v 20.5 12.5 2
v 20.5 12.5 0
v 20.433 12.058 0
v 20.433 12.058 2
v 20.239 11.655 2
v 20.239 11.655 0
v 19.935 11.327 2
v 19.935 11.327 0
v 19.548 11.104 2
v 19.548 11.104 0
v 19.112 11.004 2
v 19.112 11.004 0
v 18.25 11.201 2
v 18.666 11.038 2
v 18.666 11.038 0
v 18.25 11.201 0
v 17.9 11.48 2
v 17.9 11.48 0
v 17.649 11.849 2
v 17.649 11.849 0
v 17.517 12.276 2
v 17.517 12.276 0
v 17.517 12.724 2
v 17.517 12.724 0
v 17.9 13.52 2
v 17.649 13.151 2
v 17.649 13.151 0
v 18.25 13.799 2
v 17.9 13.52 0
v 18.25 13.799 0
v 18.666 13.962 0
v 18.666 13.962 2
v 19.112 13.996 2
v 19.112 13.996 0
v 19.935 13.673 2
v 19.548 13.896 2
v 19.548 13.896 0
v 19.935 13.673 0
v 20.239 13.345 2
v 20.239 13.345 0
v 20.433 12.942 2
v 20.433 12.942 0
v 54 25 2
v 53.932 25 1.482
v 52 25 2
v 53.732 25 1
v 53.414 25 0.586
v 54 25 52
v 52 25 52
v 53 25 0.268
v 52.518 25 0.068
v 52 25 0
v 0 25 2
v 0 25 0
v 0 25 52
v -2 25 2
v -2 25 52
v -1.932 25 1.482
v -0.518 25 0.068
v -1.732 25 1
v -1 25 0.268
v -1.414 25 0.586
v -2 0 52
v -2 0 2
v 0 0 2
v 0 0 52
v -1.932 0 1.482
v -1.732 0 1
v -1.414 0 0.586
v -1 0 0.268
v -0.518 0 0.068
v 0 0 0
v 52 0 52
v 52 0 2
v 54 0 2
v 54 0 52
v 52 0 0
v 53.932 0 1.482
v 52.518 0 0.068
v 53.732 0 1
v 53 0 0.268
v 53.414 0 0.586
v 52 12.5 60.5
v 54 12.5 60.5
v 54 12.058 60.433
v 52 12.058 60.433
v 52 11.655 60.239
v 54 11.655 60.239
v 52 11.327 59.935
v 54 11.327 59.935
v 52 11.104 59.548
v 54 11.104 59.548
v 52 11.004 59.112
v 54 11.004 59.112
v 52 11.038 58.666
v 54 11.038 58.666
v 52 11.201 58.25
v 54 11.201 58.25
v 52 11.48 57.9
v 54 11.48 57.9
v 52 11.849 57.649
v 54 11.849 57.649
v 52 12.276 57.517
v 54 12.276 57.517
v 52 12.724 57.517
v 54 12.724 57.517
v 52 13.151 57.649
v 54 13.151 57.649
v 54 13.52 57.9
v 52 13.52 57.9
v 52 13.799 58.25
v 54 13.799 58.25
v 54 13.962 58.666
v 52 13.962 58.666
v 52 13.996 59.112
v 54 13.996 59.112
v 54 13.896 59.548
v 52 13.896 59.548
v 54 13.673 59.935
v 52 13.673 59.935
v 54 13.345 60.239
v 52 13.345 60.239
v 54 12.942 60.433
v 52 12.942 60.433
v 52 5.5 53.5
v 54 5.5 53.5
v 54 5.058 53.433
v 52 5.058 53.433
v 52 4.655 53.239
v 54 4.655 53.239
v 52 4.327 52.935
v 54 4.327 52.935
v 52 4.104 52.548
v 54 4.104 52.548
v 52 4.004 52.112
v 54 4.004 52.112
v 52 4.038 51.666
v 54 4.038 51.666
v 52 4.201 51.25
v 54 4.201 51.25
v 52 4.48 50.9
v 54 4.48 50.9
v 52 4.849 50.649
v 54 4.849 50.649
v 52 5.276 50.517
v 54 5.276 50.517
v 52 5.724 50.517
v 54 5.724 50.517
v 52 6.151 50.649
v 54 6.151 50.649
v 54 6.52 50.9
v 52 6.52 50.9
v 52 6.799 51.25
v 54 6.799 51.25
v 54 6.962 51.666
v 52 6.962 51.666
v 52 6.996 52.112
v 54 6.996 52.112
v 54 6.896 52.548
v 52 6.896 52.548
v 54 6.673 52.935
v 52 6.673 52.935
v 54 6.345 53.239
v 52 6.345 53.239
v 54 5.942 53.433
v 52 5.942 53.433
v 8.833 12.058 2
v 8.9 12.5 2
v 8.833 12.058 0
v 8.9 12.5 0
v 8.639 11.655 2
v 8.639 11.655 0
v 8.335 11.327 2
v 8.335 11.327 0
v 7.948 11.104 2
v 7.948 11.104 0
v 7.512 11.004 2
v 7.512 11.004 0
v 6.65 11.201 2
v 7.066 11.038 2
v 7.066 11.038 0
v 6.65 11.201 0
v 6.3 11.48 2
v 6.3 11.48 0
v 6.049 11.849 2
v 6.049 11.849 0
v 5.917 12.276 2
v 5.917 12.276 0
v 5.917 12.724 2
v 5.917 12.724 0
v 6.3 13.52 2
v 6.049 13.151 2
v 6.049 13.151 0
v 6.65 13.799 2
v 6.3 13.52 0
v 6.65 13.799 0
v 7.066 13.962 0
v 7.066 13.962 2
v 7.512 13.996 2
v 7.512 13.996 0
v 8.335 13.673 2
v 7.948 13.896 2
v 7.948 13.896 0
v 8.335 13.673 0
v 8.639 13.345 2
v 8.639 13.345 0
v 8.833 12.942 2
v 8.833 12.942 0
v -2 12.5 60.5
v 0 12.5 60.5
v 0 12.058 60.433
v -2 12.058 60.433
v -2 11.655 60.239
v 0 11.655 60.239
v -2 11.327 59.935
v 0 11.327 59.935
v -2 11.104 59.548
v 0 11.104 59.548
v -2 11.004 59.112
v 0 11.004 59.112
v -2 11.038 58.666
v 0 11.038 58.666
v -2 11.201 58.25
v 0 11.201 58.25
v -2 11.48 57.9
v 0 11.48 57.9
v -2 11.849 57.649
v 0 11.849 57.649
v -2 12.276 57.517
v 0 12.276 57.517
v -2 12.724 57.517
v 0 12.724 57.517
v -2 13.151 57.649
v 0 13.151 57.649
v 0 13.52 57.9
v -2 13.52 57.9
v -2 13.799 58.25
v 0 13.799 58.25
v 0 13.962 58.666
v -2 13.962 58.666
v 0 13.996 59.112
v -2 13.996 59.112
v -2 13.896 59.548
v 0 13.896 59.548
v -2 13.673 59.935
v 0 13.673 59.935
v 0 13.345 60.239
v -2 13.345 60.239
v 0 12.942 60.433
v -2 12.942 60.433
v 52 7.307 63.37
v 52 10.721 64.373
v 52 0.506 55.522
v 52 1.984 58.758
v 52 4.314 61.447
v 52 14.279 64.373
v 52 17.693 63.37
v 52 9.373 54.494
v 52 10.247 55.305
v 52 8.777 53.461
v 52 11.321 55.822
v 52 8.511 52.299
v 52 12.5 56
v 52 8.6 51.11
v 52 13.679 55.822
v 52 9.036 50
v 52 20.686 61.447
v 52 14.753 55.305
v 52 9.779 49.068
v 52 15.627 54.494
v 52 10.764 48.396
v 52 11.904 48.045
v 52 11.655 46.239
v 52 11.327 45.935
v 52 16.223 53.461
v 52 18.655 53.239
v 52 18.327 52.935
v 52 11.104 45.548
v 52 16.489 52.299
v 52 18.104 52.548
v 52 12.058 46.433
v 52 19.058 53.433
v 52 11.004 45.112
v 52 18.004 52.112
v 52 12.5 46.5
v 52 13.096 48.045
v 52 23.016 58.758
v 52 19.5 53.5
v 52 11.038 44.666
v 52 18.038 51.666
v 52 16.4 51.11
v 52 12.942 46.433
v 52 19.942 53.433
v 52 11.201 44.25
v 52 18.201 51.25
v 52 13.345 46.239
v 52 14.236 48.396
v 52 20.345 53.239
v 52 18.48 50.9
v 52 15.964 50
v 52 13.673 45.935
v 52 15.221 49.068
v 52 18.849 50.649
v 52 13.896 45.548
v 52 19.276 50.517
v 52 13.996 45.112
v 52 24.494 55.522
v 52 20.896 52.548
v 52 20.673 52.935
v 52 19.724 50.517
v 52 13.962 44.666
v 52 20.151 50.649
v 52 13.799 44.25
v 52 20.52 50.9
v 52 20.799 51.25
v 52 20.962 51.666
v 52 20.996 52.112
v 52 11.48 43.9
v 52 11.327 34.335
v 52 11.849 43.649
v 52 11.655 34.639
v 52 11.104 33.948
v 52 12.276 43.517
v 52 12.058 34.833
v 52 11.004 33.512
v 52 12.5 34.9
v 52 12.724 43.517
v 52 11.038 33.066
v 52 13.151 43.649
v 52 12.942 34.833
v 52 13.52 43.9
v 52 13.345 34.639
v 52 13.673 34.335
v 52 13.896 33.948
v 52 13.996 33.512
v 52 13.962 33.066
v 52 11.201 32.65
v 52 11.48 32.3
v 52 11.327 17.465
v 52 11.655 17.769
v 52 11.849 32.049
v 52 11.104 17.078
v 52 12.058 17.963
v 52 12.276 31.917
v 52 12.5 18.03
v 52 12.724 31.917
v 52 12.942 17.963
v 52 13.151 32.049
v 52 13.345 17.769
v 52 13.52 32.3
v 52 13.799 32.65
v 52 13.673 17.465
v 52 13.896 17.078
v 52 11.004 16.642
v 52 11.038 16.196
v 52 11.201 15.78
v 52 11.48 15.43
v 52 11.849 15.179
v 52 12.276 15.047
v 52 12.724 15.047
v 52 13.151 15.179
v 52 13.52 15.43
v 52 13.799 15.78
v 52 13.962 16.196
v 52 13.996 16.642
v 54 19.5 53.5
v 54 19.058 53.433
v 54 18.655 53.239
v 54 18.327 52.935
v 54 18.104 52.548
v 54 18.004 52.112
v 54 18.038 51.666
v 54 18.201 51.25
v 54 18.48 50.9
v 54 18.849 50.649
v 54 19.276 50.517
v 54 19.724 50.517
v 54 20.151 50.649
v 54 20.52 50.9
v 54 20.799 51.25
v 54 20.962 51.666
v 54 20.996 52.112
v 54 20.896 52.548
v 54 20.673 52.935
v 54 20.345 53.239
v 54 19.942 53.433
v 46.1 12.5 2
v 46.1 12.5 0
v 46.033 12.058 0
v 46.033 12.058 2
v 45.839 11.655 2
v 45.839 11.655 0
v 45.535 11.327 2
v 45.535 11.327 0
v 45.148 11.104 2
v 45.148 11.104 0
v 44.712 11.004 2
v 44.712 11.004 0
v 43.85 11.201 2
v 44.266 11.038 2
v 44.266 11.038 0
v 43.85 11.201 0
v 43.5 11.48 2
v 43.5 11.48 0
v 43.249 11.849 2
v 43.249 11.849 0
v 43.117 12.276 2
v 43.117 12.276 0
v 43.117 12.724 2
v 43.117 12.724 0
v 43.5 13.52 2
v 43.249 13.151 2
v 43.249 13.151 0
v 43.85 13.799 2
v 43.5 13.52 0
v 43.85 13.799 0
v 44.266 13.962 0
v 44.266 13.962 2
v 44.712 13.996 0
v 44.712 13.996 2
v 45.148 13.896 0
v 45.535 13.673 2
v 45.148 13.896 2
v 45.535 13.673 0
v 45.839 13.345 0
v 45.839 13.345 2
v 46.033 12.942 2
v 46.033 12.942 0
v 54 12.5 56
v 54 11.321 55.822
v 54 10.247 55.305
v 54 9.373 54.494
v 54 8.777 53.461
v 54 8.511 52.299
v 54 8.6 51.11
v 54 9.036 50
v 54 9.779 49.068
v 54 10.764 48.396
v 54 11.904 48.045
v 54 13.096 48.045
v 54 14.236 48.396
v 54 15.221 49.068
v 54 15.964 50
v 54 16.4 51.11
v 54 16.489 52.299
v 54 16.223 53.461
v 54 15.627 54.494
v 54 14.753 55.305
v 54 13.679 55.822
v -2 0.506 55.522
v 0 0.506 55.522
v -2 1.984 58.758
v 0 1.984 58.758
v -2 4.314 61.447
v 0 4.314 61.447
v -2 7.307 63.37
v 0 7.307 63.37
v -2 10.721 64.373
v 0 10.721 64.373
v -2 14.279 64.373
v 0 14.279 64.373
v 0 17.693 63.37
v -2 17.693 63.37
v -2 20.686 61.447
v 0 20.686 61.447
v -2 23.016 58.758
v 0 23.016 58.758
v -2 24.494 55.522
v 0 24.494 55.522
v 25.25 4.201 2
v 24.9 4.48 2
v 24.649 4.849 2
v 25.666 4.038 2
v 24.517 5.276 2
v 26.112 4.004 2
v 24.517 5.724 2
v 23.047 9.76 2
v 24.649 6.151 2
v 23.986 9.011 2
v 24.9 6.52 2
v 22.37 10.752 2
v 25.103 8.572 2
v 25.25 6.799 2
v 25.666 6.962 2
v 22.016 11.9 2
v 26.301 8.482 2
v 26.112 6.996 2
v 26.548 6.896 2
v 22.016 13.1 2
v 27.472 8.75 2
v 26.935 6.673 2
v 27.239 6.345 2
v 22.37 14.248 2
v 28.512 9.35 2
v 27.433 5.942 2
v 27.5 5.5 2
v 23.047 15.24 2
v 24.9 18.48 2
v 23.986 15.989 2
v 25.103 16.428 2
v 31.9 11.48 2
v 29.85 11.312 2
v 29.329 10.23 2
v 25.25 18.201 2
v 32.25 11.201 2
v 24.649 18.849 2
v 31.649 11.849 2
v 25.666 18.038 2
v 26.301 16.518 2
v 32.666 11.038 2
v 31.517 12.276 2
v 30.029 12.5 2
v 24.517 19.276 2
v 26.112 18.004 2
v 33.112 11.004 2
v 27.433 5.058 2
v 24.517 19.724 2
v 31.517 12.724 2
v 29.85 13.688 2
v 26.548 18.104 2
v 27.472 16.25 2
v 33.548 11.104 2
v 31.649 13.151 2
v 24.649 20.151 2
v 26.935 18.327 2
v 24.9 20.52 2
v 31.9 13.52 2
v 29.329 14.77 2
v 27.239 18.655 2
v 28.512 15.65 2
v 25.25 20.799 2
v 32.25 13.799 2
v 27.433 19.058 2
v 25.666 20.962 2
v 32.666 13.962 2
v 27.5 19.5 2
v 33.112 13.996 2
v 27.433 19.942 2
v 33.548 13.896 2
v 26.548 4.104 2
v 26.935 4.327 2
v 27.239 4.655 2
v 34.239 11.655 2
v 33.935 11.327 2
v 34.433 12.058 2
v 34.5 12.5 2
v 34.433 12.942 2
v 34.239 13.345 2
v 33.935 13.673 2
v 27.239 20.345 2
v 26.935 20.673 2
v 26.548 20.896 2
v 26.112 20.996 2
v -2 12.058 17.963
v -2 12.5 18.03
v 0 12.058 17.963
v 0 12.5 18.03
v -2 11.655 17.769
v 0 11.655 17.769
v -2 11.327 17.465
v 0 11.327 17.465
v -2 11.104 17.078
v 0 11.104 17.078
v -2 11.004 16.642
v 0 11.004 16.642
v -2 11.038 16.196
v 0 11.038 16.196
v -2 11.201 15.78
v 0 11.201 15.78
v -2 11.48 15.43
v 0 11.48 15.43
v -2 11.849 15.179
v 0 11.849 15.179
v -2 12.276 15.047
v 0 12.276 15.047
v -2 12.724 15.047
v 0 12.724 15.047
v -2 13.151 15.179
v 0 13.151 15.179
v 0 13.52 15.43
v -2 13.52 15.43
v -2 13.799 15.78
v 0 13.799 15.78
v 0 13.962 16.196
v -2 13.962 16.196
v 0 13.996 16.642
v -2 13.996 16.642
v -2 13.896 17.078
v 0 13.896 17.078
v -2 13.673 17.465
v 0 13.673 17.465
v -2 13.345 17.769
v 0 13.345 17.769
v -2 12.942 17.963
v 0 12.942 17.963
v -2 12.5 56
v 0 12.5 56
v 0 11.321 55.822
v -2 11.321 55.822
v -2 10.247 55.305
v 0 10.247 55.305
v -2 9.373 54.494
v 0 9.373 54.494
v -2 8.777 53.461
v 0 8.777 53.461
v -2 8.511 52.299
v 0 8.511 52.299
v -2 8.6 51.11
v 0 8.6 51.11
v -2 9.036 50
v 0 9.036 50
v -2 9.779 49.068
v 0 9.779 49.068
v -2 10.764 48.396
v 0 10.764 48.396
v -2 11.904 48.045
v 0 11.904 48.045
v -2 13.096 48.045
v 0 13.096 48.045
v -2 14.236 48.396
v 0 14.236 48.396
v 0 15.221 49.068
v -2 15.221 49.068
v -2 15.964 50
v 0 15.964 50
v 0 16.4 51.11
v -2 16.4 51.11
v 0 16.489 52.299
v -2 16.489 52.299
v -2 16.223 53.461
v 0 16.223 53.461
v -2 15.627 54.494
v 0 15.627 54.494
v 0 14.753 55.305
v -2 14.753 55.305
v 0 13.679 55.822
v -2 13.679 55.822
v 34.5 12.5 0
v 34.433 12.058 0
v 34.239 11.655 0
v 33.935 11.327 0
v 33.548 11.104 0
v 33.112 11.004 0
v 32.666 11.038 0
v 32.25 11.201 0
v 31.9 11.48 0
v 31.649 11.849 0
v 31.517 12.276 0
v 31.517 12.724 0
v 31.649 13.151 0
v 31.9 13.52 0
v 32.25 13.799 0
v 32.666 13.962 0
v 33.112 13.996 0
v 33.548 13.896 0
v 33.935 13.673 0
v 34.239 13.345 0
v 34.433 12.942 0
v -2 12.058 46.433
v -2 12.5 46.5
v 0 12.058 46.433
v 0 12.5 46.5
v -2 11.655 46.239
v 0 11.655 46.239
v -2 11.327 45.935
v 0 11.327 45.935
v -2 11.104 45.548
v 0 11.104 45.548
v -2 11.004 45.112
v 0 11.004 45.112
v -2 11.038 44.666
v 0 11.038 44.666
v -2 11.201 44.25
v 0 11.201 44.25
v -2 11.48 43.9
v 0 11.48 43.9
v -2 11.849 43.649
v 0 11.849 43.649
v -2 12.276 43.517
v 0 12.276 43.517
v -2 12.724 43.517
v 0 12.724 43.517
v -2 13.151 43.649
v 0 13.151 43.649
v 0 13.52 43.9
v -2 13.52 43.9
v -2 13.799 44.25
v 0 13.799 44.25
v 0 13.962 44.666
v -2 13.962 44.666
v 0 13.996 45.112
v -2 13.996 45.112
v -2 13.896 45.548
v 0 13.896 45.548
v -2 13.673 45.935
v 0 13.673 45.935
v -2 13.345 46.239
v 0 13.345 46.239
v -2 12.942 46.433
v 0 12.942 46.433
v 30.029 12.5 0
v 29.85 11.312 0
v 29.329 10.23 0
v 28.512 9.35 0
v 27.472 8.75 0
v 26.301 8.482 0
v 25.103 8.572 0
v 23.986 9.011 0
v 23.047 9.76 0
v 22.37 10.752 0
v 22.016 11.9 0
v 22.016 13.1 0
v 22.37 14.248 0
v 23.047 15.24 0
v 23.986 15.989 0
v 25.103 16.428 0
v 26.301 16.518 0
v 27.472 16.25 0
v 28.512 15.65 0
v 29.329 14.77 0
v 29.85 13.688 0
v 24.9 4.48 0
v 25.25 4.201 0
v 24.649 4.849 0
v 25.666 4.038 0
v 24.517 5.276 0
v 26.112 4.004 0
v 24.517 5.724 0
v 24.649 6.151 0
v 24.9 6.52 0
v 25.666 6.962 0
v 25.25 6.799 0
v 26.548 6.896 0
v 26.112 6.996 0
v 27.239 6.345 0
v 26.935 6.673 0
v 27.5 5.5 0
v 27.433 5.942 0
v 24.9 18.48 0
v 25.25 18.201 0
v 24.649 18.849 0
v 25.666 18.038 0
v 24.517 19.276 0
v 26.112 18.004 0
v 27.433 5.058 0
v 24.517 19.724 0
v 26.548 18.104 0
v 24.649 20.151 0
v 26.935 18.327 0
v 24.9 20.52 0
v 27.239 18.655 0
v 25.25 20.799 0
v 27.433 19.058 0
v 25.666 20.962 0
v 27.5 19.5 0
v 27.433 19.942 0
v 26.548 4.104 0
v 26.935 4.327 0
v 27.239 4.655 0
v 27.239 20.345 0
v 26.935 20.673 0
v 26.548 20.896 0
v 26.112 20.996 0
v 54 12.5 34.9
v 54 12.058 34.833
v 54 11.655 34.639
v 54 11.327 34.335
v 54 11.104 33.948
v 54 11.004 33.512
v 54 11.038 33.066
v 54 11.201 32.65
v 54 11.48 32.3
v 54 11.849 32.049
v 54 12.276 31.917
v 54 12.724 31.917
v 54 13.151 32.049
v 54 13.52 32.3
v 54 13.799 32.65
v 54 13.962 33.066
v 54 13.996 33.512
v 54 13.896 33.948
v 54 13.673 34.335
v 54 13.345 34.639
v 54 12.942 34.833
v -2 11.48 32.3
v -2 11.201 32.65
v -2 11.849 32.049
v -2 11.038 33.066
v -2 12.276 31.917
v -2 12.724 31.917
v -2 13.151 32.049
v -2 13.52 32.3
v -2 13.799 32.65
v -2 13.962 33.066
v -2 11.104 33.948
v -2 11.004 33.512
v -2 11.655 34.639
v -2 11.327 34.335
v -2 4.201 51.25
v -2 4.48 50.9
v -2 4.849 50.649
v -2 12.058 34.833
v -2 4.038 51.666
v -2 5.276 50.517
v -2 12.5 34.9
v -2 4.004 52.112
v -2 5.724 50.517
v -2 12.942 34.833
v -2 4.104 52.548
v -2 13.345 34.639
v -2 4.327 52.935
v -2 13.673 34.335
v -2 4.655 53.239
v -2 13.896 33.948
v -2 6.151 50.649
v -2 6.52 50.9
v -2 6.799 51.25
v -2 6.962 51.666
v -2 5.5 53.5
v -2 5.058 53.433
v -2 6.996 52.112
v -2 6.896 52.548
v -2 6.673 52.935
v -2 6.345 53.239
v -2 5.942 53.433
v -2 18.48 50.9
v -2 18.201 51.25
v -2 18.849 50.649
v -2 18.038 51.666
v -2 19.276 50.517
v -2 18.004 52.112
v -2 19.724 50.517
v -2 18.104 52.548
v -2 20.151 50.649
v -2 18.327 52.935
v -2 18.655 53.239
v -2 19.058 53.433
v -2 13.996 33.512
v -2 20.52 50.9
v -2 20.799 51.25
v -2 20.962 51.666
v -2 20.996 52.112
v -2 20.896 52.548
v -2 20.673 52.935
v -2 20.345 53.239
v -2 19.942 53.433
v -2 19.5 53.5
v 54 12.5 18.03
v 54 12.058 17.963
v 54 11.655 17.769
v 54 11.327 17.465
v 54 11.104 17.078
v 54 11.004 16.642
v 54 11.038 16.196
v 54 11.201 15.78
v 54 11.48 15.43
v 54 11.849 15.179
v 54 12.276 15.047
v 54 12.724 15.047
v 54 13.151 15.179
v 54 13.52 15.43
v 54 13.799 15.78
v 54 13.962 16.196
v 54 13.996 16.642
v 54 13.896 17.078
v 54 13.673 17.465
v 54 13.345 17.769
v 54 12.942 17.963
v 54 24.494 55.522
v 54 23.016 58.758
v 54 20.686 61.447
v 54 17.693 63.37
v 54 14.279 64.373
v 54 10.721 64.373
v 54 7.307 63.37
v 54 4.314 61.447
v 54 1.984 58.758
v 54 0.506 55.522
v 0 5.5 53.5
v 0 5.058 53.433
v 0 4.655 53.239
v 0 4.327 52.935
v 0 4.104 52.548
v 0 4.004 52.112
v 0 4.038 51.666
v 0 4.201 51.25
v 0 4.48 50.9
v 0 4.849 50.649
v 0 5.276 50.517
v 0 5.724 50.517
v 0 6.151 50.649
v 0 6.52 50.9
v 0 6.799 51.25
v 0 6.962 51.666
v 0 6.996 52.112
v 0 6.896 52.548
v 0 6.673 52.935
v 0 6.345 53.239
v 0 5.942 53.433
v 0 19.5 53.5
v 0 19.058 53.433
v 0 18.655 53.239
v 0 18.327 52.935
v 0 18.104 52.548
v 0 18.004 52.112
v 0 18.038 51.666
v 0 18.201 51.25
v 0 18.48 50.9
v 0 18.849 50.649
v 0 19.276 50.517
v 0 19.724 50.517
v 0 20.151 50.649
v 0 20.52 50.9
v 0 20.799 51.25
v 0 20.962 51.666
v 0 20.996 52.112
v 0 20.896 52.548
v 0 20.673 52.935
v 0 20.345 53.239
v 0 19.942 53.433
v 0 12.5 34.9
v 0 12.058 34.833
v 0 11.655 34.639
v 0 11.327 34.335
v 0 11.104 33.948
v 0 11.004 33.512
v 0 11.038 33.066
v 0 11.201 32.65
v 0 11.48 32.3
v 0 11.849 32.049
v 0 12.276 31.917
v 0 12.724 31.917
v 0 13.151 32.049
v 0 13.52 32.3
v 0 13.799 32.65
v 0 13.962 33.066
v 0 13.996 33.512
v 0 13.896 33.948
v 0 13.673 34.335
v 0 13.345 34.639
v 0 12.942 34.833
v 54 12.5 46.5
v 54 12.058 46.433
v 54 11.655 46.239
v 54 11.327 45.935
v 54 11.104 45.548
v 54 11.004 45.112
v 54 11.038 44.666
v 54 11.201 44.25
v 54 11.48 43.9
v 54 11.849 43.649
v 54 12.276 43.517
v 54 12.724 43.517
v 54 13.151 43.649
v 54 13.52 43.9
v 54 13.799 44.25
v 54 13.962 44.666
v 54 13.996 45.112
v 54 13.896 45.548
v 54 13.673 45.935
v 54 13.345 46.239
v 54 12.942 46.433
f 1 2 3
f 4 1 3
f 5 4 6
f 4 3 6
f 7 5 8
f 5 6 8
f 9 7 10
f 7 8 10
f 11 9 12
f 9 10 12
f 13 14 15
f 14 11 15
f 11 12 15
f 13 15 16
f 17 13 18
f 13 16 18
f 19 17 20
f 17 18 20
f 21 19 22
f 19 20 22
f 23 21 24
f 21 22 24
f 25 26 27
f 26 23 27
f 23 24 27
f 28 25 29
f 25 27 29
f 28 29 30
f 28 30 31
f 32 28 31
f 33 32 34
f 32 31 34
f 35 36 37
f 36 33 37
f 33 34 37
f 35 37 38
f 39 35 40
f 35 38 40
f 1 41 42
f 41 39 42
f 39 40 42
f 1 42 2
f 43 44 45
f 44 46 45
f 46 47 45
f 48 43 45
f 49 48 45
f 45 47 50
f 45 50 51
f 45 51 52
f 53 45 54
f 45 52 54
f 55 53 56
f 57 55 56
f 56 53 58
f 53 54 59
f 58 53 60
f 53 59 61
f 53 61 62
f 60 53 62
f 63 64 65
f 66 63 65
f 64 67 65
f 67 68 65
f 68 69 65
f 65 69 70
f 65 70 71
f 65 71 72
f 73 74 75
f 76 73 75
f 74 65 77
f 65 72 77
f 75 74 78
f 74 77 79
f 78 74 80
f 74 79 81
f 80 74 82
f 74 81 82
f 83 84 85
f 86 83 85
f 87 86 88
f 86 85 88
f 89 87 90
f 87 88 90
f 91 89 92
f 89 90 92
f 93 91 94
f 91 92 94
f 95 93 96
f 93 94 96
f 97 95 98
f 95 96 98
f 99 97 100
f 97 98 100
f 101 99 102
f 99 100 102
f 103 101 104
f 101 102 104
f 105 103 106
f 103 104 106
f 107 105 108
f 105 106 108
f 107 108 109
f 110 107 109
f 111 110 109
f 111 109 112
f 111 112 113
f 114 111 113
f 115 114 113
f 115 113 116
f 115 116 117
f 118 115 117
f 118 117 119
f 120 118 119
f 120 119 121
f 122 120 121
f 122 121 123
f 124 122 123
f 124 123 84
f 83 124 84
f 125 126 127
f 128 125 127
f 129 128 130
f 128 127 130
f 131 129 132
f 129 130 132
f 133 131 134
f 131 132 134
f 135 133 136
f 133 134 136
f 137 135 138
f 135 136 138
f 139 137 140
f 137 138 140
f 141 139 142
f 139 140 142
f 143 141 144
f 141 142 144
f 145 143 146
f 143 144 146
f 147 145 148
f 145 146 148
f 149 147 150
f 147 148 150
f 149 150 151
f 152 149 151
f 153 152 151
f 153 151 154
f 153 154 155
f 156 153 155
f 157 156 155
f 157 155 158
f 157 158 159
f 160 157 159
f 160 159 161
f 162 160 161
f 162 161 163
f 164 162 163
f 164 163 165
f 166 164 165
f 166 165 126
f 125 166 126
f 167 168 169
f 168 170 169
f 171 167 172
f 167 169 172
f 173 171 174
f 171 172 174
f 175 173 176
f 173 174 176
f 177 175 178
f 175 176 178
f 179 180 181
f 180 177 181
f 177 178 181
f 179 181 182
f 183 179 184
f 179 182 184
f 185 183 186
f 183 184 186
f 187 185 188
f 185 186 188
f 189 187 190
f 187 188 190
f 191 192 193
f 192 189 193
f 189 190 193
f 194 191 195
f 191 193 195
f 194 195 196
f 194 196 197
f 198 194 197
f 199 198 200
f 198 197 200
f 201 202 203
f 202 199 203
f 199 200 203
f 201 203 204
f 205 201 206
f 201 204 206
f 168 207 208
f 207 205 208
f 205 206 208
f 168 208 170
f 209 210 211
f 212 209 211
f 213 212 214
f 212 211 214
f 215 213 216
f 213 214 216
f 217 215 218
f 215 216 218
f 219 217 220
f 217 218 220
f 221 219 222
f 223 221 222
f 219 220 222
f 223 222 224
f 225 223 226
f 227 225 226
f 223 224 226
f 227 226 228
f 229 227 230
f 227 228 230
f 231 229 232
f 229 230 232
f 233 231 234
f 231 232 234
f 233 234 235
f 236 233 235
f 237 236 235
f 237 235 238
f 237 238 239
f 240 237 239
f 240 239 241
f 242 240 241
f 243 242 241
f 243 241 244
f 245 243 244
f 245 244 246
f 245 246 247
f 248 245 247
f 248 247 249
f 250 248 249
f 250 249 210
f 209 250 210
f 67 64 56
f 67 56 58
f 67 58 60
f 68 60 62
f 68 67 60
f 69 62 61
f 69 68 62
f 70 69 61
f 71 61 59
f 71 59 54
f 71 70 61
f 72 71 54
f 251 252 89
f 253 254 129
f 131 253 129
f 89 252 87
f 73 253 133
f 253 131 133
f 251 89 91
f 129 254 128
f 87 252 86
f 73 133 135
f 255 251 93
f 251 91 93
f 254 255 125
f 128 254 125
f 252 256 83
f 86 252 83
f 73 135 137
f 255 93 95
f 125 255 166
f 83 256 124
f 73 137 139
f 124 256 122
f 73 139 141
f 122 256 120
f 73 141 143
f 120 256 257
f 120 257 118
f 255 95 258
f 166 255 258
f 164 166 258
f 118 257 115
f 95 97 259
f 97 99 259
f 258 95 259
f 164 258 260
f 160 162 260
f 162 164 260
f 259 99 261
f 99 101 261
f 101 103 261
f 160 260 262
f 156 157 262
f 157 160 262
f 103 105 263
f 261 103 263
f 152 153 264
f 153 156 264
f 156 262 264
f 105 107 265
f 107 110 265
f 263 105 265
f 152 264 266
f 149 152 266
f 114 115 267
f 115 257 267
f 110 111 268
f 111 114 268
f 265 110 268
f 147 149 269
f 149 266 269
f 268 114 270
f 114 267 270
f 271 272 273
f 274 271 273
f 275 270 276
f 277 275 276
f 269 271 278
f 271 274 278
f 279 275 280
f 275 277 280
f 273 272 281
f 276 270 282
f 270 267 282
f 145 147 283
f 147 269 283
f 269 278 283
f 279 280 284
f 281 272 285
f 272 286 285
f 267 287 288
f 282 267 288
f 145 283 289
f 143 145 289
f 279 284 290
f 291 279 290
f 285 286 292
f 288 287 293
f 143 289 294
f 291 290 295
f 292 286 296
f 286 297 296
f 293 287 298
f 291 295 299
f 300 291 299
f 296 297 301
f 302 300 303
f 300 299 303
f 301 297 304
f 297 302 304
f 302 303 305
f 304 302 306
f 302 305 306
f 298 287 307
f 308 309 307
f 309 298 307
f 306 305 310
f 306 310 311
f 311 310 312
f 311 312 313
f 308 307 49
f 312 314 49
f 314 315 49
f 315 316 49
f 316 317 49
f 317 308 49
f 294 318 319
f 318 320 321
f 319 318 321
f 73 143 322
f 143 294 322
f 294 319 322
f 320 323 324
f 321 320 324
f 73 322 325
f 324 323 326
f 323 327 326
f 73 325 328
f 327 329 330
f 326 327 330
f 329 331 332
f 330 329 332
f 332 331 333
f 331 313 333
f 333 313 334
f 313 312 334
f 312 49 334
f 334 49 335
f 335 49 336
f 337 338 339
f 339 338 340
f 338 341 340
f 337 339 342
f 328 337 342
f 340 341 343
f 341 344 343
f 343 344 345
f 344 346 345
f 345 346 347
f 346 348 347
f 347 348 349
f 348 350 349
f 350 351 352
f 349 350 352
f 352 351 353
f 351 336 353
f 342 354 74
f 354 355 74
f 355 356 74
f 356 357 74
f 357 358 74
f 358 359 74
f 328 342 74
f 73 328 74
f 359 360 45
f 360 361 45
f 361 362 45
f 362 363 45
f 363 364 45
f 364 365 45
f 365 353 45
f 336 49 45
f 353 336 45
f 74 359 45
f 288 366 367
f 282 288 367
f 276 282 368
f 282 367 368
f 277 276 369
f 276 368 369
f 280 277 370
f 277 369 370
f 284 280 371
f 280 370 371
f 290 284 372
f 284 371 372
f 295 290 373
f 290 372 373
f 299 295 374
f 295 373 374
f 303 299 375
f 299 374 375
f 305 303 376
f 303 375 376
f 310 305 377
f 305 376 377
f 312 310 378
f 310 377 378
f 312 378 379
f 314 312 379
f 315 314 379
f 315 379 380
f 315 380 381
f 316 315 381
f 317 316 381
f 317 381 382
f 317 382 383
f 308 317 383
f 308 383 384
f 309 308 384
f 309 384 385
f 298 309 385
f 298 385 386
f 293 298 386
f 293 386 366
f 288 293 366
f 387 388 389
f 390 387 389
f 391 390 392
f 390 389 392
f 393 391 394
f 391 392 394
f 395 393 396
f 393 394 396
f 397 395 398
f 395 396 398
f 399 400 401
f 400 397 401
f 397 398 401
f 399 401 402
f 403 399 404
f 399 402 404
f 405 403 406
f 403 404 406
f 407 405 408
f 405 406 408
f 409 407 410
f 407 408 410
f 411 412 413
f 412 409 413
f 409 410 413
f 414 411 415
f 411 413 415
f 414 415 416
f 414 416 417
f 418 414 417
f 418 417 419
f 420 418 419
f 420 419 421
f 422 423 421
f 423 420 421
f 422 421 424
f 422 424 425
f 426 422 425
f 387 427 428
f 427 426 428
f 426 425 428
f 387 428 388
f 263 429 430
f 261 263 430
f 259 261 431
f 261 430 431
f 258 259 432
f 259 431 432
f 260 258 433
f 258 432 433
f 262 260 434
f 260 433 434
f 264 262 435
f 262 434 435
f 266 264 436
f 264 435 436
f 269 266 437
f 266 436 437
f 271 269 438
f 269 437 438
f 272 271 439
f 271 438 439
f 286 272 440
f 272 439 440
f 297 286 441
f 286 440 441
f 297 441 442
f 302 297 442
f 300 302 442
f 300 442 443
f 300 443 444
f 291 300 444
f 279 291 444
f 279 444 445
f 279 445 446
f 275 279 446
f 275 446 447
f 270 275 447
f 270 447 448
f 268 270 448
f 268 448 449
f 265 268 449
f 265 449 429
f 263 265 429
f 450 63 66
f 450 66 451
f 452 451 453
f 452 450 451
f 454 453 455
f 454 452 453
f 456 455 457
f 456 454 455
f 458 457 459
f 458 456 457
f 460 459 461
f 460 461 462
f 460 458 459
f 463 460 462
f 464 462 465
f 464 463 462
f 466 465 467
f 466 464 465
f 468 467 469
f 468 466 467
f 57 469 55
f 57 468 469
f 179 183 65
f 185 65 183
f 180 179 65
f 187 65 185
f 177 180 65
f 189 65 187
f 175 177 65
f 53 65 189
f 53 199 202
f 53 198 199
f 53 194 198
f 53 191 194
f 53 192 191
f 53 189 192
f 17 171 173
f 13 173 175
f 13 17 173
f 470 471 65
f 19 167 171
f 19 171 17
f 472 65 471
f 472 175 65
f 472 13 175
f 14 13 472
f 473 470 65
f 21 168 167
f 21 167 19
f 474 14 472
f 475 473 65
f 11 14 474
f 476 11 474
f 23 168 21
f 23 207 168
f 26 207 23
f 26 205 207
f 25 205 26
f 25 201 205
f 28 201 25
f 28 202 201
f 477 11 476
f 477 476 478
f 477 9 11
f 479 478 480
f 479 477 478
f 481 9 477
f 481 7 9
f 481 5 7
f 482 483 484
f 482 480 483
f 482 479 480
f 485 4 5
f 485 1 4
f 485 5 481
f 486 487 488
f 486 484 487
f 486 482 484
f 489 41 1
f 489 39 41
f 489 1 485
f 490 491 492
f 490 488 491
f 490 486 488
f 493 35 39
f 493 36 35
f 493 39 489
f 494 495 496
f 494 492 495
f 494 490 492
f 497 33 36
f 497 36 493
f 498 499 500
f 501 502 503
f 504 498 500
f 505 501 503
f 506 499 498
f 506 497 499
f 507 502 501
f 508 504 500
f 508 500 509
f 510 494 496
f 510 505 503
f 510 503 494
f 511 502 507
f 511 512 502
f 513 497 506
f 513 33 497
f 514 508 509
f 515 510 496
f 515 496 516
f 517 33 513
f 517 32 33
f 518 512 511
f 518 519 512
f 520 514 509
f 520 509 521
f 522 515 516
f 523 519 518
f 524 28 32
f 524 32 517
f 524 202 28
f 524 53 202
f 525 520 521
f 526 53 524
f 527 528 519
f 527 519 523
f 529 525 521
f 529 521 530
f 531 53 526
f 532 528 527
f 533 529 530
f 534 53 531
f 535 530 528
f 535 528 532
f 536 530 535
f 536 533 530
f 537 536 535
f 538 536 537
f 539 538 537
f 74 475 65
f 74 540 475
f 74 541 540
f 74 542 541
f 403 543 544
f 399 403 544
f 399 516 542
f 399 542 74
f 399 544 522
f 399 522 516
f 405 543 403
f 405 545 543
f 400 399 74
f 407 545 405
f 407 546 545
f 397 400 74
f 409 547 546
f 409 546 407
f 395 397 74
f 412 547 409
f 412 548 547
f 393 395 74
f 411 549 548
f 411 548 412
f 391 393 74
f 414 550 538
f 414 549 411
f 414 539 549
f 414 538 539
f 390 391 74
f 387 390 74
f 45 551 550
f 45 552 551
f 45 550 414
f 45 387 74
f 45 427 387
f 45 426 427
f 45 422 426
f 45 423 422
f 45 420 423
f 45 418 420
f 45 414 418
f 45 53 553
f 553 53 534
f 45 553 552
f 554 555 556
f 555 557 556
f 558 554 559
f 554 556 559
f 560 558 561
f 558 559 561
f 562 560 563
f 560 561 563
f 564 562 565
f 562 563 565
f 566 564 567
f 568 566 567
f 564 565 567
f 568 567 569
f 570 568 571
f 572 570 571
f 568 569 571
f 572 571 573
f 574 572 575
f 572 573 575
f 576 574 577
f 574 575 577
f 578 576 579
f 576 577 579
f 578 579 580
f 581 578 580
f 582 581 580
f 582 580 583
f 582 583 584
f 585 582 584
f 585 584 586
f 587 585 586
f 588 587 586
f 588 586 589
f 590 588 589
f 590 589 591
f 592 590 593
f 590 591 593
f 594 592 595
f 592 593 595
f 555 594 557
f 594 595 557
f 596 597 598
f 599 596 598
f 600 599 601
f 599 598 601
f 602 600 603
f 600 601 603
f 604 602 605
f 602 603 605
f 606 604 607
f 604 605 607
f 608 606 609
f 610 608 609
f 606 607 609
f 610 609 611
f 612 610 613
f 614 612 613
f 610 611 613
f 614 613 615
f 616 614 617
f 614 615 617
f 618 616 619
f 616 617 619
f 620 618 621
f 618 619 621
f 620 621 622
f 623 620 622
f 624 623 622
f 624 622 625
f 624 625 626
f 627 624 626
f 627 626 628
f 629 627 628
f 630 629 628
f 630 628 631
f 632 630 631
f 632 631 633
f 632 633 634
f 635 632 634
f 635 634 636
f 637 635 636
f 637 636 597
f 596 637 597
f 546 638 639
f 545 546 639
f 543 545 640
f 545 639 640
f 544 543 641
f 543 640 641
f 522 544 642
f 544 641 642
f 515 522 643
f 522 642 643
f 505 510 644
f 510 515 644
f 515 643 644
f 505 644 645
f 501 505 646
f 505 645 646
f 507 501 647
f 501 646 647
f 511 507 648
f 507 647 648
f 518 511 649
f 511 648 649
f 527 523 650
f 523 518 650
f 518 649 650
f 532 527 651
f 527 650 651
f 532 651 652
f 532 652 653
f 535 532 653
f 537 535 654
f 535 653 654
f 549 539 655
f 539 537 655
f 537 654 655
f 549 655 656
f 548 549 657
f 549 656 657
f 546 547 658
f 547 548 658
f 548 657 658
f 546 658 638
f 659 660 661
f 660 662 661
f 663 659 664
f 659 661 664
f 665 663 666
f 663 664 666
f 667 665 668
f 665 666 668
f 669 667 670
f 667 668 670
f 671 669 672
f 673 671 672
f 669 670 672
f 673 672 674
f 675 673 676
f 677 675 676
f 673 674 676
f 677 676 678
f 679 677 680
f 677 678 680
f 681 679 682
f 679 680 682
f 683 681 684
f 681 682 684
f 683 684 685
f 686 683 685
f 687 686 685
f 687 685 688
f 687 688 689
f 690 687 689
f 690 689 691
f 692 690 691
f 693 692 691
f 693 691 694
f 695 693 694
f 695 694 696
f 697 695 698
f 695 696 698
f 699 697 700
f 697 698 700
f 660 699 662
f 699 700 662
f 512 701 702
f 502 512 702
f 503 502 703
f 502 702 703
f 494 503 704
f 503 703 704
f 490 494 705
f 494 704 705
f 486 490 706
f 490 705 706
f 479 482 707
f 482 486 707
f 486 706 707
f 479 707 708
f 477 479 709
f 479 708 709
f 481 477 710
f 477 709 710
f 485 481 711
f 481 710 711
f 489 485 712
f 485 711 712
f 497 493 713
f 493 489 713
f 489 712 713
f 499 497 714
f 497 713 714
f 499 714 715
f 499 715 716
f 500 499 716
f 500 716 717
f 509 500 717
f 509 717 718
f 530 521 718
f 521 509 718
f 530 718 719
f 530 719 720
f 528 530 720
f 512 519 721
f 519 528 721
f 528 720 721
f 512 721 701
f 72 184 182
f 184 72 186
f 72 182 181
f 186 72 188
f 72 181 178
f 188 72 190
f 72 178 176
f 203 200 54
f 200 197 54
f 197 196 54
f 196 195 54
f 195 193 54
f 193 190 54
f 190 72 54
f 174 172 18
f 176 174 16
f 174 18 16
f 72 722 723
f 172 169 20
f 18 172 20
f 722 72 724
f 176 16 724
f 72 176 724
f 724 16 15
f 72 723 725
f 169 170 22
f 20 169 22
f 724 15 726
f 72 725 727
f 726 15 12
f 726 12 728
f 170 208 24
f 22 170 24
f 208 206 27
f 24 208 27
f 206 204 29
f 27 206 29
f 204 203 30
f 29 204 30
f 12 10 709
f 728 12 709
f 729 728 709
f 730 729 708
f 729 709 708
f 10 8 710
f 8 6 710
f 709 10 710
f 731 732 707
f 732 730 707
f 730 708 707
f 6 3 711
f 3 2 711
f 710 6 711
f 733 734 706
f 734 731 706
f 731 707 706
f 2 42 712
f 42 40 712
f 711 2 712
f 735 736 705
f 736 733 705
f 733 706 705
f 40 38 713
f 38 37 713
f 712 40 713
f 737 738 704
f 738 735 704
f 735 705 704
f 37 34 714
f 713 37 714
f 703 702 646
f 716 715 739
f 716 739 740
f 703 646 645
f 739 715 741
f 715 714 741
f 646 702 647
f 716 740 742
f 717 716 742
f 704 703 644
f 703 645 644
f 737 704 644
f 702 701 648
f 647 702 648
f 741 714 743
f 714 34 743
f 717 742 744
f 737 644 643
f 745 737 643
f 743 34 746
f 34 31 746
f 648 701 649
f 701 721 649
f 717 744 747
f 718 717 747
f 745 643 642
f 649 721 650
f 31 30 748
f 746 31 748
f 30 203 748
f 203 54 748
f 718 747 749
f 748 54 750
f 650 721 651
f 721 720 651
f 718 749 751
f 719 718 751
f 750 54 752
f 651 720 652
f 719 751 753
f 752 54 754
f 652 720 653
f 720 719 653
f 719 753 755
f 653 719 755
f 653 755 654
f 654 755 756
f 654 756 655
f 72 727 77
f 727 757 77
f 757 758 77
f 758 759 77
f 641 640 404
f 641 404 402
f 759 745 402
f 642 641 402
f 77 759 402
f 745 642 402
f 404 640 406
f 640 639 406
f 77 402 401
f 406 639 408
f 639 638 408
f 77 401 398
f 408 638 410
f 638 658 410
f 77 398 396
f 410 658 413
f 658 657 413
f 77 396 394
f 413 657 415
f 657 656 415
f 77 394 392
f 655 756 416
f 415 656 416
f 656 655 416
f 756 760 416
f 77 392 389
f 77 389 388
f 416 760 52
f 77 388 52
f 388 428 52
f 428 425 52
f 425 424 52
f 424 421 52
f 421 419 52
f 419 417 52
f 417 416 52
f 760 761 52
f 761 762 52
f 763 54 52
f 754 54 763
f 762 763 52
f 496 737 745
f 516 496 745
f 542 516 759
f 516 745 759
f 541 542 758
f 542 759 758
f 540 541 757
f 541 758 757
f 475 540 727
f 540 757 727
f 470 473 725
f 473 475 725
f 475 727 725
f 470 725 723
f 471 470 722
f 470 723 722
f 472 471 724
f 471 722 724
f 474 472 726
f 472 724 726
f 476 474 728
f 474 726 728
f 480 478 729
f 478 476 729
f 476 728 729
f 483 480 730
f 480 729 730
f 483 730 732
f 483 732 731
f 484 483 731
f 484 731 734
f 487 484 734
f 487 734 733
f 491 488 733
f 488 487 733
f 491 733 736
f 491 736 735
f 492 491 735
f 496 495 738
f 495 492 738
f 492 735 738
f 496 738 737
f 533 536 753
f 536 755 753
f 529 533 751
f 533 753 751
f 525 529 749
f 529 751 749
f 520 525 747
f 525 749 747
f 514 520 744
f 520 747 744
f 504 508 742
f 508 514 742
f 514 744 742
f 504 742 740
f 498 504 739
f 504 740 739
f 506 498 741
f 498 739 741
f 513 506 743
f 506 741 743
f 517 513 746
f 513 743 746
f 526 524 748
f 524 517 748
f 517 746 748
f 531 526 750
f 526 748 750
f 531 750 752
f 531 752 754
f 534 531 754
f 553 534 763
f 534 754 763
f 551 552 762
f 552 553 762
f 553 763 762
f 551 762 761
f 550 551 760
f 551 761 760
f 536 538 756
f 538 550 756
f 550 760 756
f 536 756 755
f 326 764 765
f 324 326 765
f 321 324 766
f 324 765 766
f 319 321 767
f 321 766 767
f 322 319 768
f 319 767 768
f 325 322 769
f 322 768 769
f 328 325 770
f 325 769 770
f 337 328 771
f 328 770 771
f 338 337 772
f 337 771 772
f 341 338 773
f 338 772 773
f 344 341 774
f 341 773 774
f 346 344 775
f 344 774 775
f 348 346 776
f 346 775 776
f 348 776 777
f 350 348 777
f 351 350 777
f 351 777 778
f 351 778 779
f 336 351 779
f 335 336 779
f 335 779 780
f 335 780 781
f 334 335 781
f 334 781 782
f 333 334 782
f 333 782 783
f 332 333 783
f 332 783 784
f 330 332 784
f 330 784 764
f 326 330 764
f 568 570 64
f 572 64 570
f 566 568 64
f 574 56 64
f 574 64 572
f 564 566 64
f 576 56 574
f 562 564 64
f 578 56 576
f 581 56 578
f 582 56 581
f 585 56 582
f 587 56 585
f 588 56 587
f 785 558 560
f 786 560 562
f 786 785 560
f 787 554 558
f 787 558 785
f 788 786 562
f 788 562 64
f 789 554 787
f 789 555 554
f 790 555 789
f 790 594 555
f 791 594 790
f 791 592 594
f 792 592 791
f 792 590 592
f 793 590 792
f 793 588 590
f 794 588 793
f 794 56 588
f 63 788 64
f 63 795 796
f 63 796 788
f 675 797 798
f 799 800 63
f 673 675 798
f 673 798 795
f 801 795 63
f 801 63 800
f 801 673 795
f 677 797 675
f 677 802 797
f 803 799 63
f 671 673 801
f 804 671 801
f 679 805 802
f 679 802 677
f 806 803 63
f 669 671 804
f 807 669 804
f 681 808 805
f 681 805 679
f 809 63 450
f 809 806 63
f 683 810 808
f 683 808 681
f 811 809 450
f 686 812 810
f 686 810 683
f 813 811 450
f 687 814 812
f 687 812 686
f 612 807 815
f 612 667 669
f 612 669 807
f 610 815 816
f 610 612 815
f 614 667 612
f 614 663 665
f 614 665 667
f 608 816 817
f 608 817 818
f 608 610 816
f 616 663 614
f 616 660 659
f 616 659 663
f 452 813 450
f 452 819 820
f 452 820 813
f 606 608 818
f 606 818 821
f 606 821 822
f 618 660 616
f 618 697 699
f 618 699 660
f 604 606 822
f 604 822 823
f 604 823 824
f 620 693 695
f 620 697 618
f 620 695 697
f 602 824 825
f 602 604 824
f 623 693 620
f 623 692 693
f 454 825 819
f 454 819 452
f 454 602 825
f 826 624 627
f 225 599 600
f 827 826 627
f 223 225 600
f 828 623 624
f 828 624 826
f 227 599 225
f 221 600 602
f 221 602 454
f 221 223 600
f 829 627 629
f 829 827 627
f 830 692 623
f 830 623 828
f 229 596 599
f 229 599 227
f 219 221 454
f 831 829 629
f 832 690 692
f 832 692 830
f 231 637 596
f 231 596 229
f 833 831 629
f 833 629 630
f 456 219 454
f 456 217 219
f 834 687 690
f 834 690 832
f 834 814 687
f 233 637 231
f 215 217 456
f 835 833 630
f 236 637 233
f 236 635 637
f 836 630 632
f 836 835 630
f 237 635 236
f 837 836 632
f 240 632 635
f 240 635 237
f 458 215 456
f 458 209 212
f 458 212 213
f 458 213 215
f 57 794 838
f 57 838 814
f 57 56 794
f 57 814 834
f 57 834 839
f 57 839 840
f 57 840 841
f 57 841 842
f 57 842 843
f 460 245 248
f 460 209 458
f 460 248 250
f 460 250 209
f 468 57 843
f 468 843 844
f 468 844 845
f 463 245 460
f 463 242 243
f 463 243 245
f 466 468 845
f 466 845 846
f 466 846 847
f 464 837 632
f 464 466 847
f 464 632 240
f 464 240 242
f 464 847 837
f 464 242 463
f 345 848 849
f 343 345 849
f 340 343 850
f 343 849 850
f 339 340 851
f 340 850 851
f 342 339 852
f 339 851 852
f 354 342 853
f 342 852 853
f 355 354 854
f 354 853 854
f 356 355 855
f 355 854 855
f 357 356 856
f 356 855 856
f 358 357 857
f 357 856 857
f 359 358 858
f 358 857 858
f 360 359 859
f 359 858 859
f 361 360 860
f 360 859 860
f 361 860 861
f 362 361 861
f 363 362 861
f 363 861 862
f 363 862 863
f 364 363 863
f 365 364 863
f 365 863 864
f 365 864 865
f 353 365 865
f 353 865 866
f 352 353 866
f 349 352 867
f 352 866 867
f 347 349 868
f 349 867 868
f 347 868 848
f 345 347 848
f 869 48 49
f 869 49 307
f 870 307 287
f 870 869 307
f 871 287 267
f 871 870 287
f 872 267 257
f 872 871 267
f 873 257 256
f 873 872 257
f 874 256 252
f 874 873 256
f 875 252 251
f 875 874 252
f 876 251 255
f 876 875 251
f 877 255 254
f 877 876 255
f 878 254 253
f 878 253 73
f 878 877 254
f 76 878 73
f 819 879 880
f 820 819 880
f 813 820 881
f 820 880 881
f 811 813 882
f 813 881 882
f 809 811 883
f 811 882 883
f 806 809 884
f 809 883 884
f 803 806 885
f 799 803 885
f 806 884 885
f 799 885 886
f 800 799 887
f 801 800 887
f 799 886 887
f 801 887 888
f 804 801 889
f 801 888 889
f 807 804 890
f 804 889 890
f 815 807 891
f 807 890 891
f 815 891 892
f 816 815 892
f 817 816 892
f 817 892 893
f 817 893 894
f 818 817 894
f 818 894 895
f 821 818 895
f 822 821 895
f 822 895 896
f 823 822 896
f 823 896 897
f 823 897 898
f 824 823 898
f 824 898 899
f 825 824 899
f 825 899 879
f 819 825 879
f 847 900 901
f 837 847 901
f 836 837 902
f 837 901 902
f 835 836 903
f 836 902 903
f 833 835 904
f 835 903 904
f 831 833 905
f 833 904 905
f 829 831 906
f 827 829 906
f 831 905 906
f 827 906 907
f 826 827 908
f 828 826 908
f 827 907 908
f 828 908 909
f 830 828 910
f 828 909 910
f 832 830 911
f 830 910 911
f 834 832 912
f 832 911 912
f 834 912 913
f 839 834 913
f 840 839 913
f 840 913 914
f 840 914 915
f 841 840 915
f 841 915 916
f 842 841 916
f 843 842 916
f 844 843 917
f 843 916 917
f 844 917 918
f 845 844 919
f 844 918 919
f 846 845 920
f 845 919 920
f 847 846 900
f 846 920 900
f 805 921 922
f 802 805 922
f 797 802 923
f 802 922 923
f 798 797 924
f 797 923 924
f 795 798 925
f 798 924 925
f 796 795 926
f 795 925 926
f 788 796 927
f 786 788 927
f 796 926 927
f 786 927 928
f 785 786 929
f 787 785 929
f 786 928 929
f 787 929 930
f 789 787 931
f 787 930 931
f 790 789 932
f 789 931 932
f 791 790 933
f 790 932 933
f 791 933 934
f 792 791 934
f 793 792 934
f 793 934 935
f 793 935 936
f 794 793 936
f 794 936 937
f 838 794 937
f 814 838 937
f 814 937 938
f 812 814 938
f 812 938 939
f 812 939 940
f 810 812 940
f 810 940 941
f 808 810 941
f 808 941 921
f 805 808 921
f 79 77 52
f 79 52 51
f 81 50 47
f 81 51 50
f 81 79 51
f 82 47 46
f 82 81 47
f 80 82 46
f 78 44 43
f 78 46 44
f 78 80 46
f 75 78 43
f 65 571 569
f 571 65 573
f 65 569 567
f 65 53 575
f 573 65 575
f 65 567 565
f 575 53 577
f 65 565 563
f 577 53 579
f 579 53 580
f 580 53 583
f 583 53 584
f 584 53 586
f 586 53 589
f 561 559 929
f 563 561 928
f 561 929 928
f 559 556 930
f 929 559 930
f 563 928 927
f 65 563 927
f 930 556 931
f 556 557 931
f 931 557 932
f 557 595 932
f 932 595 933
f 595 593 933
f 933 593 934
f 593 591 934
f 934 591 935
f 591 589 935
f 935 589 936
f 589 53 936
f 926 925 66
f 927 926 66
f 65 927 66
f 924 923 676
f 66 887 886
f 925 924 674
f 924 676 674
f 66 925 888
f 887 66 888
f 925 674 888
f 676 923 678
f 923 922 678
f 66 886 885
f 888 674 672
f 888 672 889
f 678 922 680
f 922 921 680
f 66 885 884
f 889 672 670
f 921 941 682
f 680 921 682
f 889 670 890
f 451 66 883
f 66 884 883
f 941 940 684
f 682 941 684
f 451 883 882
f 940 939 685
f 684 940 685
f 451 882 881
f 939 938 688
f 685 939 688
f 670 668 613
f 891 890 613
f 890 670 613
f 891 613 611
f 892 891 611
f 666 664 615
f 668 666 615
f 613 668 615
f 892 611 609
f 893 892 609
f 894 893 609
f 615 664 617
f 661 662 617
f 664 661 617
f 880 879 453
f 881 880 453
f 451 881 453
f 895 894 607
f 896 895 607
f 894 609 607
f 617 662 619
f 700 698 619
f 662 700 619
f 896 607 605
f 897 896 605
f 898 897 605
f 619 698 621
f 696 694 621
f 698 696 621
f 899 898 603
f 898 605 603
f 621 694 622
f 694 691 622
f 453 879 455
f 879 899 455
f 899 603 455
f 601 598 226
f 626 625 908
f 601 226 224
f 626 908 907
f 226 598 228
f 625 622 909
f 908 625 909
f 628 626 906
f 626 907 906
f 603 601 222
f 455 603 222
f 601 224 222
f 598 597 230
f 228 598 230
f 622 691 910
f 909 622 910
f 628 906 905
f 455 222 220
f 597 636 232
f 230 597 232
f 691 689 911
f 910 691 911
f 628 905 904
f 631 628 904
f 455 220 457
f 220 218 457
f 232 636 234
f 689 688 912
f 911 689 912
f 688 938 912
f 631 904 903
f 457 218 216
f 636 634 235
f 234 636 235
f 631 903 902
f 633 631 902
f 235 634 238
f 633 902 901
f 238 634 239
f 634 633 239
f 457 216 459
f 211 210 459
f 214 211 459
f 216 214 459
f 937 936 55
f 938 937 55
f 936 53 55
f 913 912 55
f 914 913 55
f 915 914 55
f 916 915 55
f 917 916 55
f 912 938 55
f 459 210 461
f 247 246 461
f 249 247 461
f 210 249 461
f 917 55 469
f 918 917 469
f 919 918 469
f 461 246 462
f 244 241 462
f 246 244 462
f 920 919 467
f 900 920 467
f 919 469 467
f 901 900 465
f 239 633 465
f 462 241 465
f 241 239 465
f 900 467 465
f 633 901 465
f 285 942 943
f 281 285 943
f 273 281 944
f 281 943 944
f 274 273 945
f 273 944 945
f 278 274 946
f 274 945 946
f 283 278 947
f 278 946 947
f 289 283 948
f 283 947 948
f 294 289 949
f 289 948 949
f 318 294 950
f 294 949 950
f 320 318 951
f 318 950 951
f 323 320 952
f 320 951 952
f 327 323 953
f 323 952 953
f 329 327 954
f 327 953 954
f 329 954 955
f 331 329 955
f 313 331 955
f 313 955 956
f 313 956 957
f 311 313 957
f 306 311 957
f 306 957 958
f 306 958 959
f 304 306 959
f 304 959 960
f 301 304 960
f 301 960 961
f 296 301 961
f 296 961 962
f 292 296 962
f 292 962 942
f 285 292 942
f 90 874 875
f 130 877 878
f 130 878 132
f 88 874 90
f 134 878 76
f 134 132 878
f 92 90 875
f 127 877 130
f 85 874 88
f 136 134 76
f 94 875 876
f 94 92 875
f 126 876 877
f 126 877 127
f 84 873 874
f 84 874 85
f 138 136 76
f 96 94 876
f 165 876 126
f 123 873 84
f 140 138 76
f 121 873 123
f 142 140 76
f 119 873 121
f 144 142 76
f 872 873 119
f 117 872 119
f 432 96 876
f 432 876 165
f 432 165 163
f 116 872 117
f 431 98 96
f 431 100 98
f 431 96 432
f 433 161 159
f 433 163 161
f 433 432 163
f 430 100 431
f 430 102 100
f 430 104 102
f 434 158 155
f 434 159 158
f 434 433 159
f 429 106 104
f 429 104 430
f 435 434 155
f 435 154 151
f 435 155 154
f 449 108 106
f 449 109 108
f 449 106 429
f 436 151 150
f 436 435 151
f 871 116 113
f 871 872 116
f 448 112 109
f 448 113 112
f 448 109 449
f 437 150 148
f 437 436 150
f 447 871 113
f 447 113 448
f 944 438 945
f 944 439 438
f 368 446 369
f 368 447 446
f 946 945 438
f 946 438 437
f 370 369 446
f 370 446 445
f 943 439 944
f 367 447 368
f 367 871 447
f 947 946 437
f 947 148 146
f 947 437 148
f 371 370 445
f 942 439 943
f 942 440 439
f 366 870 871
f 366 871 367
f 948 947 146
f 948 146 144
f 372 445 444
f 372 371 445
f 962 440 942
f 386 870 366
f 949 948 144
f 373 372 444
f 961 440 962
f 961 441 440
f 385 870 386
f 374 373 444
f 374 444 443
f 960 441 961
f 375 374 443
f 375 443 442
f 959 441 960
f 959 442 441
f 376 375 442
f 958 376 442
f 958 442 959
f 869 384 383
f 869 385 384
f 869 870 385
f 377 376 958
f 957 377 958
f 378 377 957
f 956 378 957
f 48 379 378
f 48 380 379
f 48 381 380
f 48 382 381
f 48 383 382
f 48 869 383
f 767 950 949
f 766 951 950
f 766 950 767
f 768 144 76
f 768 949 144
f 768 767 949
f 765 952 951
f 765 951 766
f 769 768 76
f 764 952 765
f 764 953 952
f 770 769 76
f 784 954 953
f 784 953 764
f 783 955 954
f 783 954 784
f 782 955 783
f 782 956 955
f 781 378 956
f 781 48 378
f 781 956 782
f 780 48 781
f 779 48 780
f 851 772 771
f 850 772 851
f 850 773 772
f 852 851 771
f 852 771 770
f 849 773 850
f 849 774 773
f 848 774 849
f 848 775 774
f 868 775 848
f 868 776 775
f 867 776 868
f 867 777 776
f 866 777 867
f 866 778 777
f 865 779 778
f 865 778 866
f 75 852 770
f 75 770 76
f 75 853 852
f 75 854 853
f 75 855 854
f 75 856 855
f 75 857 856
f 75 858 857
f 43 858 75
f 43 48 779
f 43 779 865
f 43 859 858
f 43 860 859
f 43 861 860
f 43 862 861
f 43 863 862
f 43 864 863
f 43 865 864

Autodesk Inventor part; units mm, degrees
ref_plane "YZ Plane" through (0, 0, 0) normal (1, 0, 0) x (0, 1, 0)
ref_plane "XZ Plane" through (0, 0, 0) normal (0, 1, 0) x (-1, 0, 0)
ref_plane "XY Plane" through (0, 0, 0) normal (0, 0, 1) x (1, 0, 0)
sketch "Sketch1" plane through (0, 0, 0) normal (0, 0, 1) x (1, 0, 0)
  line L0 (0, 0) -> (52, 0)
  line L1 (52, 0) -> (52, 25)
  line L2 (52, 25) -> (0, 25)
  line L3 (0, 25) -> (0, 0)
  circle A0 centre (26, 19.5) radius 1.5
  circle A1 centre (19, 12.5) radius 1.5
  circle A2 centre (33, 12.5) radius 1.5
  circle A3 centre (26, 5.5) radius 1.5
  circle A4 centre (7.4, 12.5) radius 1.5
  circle A5 centre (44.6, 12.5) radius 1.5
  circle A6 centre (26, 12.5) radius 4.0289
  line L4 (52, 25) -> (54, 25)
  line L5 (54, 25) -> (54, 0)
  line L6 (54, 0) -> (52, 0)
  line L7 (52, 0) -> (52, 25)
  line L8 (0, 25) -> (-2, 25)
  line L9 (-2, 25) -> (-2, 0)
  line L10 (-2, 0) -> (0, 0)
  line L11 (0, 0) -> (0, 25)
  dimension "d0" = 52
  dimension "d1" = 25
  dimension "d2" = 3
  dimension "d3" = 3
  dimension "d4" = 3
  dimension "d5" = 3
  dimension "d6" = 3
  dimension "d7" = 3
  dimension "d9" = 7.4
  dimension "d10" = 7.4
  dimension "d11" = 26
  dimension "d13" = 2
  dimension "d14" = 2
extrude "Extrusion1" add sketch "Sketch1" along normal blind 2 contours L3 L2 L1 L0
extrude "Extrusion2" add sketch "Sketch1" along normal blind 3 contours L10 L9 L8 L3 | L1 L4 L5 L6
sketch "Sketch2" plane through (0, 0, 3) normal (0, 0, 1) x (1, 0, 0)
  line L0 (54, 25) -> (-2, 25) projected
  line L1 (0, 0) -> (0, 25) projected
  line L2 (-2, 25) -> (0, 25)
  line L3 (0, 25) -> (0, 0)
  line L4 (0, 0) -> (-2, 0)
  line L5 (-2, 0) -> (-2, 25)
  line L6 (52, 25) -> (52, 0) projected
  line L7 (54, 0) -> (54, 25) projected
  line L8 (52, 25) -> (54, 25)
  line L9 (54, 25) -> (54, 0)
  line L10 (54, 0) -> (52, 0)
  line L11 (52, 0) -> (52, 25)
extrude "Extrusion3" add sketch "Sketch2" along normal blind 49
sketch "Sketch3" plane through (54, 0, 0) normal (1, 0, 0) x (0, 0, -1)
  line L0 (-52, 0) -> (-52, 25) projected
  line L1 (-2, 25) -> (-52, 25) projected
  line L2 (-2, 0) -> (-52, 0) projected
  arc A0 (-52, 25) -> (-52, 0) centre (-52, 12.5) ccw
  line L3 (-52, 0) -> (-52, 25) projected
  point P0 (0, 0)
  dimension "d22" = 12.5
extrude "Extrusion4" add sketch "Sketch3" against normal blind 2
sketch "Sketch4" plane through (-2, 0, 0) normal (-1, 0, 0) x (0, 0, 1)
  arc A0 (52, 0) -> (52, 25) centre (52, 12.5) ccw projected
  line L0 (2, 25) -> (52, 25) projected
  arc A1 (52, 0) -> (52, 25) centre (52, 12.5) ccw
  line L1 (52, 25) -> (52, 0)
  point P0 (0, 0)
extrude "Extrusion5" add sketch "Sketch4" against normal blind 2
fillet "Fillet1" radius 2 2 edges at (54, 12.5, 0) (-2, 12.5, 0)
sketch "Sketch5" plane through (-2, 12.5, 52) normal (-1, 0, 0) x (0, 0, 1)
  circle A0 centre (0, 0) radius 4
  circle A1 centre (0, 0) radius 7
  circle A2 centre (0, 7) radius 1.5
  circle A3 centre (-7, 0) radius 1.5
  circle A4 centre (0, -7) radius 1.5
  circle A5 centre (7, 0) radius 1.5
  circle A6 centre (-18.6, 0) radius 1.3978
  circle A7 centre (-35.47, 0) radius 1.5
  point P0 (-52, -12.5)
  dimension "d29" = 14
  dimension "d28" = 8
  dimension "d32" = 360
  dimension "d34" = 3
  dimension "d35" = 18.6
  dimension "d50" = 3
  dimension "d51" = 16.87
hole "Hole1" at (-2, 12.5, 52) at (-2, 12.5, 45) at (-2, 19.5, 52) at (-2, 12.5, 59) at (-2, 5.5, 52) at (-2, 12.5, 33.4) direction (1, 0, 0) diameter 3 end through all
hole "Hole2" at (-2, 12.5, 52) direction (1, 0, 0) diameter 8 end through all
hole "Hole3" at (-2, 12.5, 16.53) direction (1, 0, 0) diameter 3 end through all
properties part number "Bracket U CORTO"
